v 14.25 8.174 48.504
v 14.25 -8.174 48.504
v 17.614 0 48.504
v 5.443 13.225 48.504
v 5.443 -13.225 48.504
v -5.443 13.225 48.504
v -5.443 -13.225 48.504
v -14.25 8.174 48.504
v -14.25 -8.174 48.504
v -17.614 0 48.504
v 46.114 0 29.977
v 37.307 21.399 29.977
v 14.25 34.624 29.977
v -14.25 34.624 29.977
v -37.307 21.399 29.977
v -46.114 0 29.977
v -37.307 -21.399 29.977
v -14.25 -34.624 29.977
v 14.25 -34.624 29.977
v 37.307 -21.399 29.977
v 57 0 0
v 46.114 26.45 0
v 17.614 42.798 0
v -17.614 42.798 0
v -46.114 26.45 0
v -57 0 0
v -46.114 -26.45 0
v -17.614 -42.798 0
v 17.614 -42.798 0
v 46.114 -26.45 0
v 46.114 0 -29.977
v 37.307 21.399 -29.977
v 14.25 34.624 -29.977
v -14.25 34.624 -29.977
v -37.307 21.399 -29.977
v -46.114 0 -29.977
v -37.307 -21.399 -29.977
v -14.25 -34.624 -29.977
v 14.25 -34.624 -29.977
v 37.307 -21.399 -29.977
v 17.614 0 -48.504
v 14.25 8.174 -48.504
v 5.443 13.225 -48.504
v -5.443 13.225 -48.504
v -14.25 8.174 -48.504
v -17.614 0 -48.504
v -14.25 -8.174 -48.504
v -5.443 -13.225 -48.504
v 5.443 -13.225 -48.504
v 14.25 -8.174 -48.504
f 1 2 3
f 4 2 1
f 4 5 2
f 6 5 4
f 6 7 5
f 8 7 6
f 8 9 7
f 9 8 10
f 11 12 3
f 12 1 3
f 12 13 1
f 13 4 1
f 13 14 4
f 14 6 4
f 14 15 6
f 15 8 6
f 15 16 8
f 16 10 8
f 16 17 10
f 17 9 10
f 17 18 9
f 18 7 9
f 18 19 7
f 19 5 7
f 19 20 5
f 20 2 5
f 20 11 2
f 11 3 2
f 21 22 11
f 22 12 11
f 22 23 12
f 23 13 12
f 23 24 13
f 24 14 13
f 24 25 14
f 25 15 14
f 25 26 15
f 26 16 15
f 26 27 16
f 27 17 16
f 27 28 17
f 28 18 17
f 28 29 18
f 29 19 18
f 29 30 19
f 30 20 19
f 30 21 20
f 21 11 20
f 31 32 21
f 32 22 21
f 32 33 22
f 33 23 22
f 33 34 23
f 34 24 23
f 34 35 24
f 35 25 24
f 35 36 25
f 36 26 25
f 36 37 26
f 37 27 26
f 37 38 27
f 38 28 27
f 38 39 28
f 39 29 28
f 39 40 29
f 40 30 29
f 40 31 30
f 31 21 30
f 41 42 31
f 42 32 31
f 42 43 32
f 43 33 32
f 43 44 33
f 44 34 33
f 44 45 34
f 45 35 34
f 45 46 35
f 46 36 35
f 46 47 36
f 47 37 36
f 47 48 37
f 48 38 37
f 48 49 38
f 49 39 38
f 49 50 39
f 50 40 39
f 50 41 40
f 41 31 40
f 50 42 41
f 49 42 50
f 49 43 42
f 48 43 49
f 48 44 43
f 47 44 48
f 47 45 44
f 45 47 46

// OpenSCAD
// Generated by SolidPython 1.0.1 on 2020-07-29 00:46:54


scale(v = [19, 15, 17]) {
	sphere(r = 3);
}
/***********************************************
*********      SolidPython code:      **********
************************************************
 
# import packages: SolidPython
from solid import *
from solid.utils import *
from itertools import chain, combinations, permutations


class Resize:

    def __init__(self, scad_file):
        self.scad_file = scad_file
        #self.scad_file = import_scad(scad_file)
        # cone/cylinder param:
        self.r1 = 0
        self.r2 = 0
        self.h = 0
        # rectangular prism param:
        self.w = 0
        self.l = 0
        # ellipse param:
        self.r = 0

    # import OpenScad code (file name corresponds to shape)


    # classify shape + parameters
    def assign(self, param1, param2, param3):
        if self.scad_file == 'cone.scad':
            self.r1 = param1
            self.r2 = param2
            self.h = param3
        elif self.scad_file == 'cylinder.scad':
            self.r1 = param1
            self.r2 = param2
            self.h = param3
        elif self.scad_file == 'rectangularPrism.scad':
            self.h = param1
            self.l = param2
            self.w = param3
        else:
            self.r = param1
            self.h = param2

    # resize parameters
    def iterate(self):
        x = range(3, 20, 2)
        i = 1
        if self.scad_file == 'cone.scad':
            tempList = list(permutations(x, 2))
            for temp in tempList:
                param1 = temp[0]
                param2 = temp[1]
                filepath = 'produced_scad_files/' + 'cone' + str(param1) + '_' + str(param2) + '_' + '.scad'
                scad_render_to_file(cylinder(h=param1, r1=param2, r2=0), filepath)

        elif self.scad_file == 'cylinder.scad':
            tempList = list(permutations(x, 3))
            for temp in tempList:
                param1 = temp[0]
                param2 = temp[1]
                filepath = 'produced_scad_files/' + 'cylinder' + str(param1) + '_' + str(param2) + '_' + '.scad'
                scad_render_to_file(cylinder(h=param1, r1=param2, r2=param2), filepath)

        elif self.scad_file == 'rectangularPrism.scad':
            tempList = list(permutations(x, 3))
            for temp in tempList:
                param1 = temp[0]
                param2 = temp[1]
                param3 = temp[2]
                filepath = 'produced_scad_files/' + 'rectangularPrism' + str(param1) + '_' + str(param2) + '_' + str(
                    param3) + '.scad'
                scad_render_to_file(cube(size=(param1, param2, param3)), filepath)

        elif self.scad_file == 'ellipse.scad':
            tempList = list(permutations(x, 4))
            for temp in tempList:
                param1 = temp[0]
                param2 = temp[1]
                param3 = temp[2]
                param4 = temp[3]
                filepath = 'produced_scad_files/' + 'ellipse' + str(param1) + '_' + str(param2) + '_' + str(param3) + '_' + str(param4) + '.scad'
                scad_render_to_file(scale([param1, param2, param3])(sphere(r=param4)), filepath)

    def render_to_scadfile(self):
        scad_render_to_file(scad, 'example.scad') 
 
************************************************/
